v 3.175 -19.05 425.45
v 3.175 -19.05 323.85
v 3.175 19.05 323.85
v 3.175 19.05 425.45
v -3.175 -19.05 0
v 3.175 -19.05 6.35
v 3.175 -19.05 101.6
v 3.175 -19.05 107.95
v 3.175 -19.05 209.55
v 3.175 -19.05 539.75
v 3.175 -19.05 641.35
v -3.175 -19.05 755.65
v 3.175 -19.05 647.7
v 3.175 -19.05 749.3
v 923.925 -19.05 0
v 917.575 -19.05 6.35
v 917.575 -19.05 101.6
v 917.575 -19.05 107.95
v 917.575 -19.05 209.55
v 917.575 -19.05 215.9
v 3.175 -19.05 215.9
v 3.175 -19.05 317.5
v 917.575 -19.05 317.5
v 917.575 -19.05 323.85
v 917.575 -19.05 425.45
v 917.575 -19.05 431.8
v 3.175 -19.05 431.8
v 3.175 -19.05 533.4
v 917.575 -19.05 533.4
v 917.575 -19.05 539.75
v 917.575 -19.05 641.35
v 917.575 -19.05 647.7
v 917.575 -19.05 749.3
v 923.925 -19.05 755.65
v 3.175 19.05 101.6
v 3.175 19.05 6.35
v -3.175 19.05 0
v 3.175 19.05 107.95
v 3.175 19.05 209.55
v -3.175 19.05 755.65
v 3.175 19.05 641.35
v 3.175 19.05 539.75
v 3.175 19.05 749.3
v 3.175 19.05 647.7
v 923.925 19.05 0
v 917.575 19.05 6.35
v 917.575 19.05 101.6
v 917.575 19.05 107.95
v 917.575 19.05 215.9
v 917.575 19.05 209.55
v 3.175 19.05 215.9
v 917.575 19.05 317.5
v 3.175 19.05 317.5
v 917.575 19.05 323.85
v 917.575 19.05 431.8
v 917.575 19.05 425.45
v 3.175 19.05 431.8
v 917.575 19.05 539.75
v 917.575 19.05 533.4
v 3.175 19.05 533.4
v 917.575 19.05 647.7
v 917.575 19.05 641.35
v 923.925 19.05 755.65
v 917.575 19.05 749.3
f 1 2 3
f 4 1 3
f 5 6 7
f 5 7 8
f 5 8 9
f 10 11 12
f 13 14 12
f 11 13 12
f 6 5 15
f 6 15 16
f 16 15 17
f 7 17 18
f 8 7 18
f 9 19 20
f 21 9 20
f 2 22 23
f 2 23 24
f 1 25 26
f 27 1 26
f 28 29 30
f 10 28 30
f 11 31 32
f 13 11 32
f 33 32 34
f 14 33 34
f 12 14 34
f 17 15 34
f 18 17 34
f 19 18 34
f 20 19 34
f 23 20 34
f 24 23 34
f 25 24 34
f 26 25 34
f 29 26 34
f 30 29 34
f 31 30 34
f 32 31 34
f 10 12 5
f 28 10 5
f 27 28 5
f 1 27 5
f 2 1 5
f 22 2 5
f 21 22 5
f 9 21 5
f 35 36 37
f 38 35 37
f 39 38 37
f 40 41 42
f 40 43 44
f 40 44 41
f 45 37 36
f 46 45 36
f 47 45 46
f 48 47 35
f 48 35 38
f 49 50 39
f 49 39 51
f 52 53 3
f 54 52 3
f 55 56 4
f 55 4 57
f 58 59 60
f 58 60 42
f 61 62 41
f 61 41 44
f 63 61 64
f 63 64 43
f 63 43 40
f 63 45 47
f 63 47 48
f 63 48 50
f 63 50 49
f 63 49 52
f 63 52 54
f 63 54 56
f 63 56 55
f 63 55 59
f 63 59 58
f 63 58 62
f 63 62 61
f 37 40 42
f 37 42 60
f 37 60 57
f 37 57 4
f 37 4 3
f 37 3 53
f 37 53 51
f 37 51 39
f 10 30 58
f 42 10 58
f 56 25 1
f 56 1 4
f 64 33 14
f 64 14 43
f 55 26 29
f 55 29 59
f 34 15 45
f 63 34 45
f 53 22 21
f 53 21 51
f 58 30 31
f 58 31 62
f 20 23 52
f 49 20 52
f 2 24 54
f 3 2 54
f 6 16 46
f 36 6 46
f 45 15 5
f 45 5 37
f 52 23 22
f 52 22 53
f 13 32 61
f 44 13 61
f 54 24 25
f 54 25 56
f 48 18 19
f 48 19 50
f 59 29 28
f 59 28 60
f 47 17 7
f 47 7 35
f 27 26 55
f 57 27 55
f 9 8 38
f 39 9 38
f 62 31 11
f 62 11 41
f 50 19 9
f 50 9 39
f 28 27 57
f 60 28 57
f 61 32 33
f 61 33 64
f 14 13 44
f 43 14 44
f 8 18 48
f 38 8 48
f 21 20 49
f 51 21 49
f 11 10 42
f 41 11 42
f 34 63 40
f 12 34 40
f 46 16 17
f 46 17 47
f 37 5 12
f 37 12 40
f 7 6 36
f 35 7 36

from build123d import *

# Parameters (mm, degrees)
F0_W     = 6.35
F0_H     = 38.1
F1_DEPTH = 755.65
F2_W     = 38.1
F2_H     = 6.35
F3_DEPTH = 457.2


with BuildPart() as f1:
    # F0 (on Top) → F1 (new body)
    with BuildSketch(Plane.XY):
        Rectangle(F0_W, F0_H)
    extrude(amount=F1_DEPTH)

    # F2 (on face) → F3 (join)
    with BuildSketch(Plane.YZ.offset(3.175)):
        with Locations((0, 104.775)):
            Rectangle(F2_W, F2_H)
        with Locations((0, 3.175)):
            Rectangle(F2_W, F2_H)
        with Locations((0, 212.725)):
            Rectangle(F2_W, F2_H)
        with Locations((0, 320.675)):
            Rectangle(F2_W, F2_H)
        with Locations((0, 428.625)):
            Rectangle(F2_W, F2_H)
        with Locations((0, 536.575)):
            Rectangle(F2_W, F2_H)
        with Locations((0, 644.525)):
            Rectangle(F2_W, F2_H)
        with Locations((0, 752.475)):
            Rectangle(F2_W, F2_H)
    extrude(amount=F3_DEPTH)

    # F4: F1 across face


with BuildPart() as f1_1:
    add(f1.part)
    add(f1.part.mirror(Plane(origin=(460.375, 0, 644.525), x_dir=(0, 1, 0), z_dir=(1, 0, 0))))


solid = f1_1.part
